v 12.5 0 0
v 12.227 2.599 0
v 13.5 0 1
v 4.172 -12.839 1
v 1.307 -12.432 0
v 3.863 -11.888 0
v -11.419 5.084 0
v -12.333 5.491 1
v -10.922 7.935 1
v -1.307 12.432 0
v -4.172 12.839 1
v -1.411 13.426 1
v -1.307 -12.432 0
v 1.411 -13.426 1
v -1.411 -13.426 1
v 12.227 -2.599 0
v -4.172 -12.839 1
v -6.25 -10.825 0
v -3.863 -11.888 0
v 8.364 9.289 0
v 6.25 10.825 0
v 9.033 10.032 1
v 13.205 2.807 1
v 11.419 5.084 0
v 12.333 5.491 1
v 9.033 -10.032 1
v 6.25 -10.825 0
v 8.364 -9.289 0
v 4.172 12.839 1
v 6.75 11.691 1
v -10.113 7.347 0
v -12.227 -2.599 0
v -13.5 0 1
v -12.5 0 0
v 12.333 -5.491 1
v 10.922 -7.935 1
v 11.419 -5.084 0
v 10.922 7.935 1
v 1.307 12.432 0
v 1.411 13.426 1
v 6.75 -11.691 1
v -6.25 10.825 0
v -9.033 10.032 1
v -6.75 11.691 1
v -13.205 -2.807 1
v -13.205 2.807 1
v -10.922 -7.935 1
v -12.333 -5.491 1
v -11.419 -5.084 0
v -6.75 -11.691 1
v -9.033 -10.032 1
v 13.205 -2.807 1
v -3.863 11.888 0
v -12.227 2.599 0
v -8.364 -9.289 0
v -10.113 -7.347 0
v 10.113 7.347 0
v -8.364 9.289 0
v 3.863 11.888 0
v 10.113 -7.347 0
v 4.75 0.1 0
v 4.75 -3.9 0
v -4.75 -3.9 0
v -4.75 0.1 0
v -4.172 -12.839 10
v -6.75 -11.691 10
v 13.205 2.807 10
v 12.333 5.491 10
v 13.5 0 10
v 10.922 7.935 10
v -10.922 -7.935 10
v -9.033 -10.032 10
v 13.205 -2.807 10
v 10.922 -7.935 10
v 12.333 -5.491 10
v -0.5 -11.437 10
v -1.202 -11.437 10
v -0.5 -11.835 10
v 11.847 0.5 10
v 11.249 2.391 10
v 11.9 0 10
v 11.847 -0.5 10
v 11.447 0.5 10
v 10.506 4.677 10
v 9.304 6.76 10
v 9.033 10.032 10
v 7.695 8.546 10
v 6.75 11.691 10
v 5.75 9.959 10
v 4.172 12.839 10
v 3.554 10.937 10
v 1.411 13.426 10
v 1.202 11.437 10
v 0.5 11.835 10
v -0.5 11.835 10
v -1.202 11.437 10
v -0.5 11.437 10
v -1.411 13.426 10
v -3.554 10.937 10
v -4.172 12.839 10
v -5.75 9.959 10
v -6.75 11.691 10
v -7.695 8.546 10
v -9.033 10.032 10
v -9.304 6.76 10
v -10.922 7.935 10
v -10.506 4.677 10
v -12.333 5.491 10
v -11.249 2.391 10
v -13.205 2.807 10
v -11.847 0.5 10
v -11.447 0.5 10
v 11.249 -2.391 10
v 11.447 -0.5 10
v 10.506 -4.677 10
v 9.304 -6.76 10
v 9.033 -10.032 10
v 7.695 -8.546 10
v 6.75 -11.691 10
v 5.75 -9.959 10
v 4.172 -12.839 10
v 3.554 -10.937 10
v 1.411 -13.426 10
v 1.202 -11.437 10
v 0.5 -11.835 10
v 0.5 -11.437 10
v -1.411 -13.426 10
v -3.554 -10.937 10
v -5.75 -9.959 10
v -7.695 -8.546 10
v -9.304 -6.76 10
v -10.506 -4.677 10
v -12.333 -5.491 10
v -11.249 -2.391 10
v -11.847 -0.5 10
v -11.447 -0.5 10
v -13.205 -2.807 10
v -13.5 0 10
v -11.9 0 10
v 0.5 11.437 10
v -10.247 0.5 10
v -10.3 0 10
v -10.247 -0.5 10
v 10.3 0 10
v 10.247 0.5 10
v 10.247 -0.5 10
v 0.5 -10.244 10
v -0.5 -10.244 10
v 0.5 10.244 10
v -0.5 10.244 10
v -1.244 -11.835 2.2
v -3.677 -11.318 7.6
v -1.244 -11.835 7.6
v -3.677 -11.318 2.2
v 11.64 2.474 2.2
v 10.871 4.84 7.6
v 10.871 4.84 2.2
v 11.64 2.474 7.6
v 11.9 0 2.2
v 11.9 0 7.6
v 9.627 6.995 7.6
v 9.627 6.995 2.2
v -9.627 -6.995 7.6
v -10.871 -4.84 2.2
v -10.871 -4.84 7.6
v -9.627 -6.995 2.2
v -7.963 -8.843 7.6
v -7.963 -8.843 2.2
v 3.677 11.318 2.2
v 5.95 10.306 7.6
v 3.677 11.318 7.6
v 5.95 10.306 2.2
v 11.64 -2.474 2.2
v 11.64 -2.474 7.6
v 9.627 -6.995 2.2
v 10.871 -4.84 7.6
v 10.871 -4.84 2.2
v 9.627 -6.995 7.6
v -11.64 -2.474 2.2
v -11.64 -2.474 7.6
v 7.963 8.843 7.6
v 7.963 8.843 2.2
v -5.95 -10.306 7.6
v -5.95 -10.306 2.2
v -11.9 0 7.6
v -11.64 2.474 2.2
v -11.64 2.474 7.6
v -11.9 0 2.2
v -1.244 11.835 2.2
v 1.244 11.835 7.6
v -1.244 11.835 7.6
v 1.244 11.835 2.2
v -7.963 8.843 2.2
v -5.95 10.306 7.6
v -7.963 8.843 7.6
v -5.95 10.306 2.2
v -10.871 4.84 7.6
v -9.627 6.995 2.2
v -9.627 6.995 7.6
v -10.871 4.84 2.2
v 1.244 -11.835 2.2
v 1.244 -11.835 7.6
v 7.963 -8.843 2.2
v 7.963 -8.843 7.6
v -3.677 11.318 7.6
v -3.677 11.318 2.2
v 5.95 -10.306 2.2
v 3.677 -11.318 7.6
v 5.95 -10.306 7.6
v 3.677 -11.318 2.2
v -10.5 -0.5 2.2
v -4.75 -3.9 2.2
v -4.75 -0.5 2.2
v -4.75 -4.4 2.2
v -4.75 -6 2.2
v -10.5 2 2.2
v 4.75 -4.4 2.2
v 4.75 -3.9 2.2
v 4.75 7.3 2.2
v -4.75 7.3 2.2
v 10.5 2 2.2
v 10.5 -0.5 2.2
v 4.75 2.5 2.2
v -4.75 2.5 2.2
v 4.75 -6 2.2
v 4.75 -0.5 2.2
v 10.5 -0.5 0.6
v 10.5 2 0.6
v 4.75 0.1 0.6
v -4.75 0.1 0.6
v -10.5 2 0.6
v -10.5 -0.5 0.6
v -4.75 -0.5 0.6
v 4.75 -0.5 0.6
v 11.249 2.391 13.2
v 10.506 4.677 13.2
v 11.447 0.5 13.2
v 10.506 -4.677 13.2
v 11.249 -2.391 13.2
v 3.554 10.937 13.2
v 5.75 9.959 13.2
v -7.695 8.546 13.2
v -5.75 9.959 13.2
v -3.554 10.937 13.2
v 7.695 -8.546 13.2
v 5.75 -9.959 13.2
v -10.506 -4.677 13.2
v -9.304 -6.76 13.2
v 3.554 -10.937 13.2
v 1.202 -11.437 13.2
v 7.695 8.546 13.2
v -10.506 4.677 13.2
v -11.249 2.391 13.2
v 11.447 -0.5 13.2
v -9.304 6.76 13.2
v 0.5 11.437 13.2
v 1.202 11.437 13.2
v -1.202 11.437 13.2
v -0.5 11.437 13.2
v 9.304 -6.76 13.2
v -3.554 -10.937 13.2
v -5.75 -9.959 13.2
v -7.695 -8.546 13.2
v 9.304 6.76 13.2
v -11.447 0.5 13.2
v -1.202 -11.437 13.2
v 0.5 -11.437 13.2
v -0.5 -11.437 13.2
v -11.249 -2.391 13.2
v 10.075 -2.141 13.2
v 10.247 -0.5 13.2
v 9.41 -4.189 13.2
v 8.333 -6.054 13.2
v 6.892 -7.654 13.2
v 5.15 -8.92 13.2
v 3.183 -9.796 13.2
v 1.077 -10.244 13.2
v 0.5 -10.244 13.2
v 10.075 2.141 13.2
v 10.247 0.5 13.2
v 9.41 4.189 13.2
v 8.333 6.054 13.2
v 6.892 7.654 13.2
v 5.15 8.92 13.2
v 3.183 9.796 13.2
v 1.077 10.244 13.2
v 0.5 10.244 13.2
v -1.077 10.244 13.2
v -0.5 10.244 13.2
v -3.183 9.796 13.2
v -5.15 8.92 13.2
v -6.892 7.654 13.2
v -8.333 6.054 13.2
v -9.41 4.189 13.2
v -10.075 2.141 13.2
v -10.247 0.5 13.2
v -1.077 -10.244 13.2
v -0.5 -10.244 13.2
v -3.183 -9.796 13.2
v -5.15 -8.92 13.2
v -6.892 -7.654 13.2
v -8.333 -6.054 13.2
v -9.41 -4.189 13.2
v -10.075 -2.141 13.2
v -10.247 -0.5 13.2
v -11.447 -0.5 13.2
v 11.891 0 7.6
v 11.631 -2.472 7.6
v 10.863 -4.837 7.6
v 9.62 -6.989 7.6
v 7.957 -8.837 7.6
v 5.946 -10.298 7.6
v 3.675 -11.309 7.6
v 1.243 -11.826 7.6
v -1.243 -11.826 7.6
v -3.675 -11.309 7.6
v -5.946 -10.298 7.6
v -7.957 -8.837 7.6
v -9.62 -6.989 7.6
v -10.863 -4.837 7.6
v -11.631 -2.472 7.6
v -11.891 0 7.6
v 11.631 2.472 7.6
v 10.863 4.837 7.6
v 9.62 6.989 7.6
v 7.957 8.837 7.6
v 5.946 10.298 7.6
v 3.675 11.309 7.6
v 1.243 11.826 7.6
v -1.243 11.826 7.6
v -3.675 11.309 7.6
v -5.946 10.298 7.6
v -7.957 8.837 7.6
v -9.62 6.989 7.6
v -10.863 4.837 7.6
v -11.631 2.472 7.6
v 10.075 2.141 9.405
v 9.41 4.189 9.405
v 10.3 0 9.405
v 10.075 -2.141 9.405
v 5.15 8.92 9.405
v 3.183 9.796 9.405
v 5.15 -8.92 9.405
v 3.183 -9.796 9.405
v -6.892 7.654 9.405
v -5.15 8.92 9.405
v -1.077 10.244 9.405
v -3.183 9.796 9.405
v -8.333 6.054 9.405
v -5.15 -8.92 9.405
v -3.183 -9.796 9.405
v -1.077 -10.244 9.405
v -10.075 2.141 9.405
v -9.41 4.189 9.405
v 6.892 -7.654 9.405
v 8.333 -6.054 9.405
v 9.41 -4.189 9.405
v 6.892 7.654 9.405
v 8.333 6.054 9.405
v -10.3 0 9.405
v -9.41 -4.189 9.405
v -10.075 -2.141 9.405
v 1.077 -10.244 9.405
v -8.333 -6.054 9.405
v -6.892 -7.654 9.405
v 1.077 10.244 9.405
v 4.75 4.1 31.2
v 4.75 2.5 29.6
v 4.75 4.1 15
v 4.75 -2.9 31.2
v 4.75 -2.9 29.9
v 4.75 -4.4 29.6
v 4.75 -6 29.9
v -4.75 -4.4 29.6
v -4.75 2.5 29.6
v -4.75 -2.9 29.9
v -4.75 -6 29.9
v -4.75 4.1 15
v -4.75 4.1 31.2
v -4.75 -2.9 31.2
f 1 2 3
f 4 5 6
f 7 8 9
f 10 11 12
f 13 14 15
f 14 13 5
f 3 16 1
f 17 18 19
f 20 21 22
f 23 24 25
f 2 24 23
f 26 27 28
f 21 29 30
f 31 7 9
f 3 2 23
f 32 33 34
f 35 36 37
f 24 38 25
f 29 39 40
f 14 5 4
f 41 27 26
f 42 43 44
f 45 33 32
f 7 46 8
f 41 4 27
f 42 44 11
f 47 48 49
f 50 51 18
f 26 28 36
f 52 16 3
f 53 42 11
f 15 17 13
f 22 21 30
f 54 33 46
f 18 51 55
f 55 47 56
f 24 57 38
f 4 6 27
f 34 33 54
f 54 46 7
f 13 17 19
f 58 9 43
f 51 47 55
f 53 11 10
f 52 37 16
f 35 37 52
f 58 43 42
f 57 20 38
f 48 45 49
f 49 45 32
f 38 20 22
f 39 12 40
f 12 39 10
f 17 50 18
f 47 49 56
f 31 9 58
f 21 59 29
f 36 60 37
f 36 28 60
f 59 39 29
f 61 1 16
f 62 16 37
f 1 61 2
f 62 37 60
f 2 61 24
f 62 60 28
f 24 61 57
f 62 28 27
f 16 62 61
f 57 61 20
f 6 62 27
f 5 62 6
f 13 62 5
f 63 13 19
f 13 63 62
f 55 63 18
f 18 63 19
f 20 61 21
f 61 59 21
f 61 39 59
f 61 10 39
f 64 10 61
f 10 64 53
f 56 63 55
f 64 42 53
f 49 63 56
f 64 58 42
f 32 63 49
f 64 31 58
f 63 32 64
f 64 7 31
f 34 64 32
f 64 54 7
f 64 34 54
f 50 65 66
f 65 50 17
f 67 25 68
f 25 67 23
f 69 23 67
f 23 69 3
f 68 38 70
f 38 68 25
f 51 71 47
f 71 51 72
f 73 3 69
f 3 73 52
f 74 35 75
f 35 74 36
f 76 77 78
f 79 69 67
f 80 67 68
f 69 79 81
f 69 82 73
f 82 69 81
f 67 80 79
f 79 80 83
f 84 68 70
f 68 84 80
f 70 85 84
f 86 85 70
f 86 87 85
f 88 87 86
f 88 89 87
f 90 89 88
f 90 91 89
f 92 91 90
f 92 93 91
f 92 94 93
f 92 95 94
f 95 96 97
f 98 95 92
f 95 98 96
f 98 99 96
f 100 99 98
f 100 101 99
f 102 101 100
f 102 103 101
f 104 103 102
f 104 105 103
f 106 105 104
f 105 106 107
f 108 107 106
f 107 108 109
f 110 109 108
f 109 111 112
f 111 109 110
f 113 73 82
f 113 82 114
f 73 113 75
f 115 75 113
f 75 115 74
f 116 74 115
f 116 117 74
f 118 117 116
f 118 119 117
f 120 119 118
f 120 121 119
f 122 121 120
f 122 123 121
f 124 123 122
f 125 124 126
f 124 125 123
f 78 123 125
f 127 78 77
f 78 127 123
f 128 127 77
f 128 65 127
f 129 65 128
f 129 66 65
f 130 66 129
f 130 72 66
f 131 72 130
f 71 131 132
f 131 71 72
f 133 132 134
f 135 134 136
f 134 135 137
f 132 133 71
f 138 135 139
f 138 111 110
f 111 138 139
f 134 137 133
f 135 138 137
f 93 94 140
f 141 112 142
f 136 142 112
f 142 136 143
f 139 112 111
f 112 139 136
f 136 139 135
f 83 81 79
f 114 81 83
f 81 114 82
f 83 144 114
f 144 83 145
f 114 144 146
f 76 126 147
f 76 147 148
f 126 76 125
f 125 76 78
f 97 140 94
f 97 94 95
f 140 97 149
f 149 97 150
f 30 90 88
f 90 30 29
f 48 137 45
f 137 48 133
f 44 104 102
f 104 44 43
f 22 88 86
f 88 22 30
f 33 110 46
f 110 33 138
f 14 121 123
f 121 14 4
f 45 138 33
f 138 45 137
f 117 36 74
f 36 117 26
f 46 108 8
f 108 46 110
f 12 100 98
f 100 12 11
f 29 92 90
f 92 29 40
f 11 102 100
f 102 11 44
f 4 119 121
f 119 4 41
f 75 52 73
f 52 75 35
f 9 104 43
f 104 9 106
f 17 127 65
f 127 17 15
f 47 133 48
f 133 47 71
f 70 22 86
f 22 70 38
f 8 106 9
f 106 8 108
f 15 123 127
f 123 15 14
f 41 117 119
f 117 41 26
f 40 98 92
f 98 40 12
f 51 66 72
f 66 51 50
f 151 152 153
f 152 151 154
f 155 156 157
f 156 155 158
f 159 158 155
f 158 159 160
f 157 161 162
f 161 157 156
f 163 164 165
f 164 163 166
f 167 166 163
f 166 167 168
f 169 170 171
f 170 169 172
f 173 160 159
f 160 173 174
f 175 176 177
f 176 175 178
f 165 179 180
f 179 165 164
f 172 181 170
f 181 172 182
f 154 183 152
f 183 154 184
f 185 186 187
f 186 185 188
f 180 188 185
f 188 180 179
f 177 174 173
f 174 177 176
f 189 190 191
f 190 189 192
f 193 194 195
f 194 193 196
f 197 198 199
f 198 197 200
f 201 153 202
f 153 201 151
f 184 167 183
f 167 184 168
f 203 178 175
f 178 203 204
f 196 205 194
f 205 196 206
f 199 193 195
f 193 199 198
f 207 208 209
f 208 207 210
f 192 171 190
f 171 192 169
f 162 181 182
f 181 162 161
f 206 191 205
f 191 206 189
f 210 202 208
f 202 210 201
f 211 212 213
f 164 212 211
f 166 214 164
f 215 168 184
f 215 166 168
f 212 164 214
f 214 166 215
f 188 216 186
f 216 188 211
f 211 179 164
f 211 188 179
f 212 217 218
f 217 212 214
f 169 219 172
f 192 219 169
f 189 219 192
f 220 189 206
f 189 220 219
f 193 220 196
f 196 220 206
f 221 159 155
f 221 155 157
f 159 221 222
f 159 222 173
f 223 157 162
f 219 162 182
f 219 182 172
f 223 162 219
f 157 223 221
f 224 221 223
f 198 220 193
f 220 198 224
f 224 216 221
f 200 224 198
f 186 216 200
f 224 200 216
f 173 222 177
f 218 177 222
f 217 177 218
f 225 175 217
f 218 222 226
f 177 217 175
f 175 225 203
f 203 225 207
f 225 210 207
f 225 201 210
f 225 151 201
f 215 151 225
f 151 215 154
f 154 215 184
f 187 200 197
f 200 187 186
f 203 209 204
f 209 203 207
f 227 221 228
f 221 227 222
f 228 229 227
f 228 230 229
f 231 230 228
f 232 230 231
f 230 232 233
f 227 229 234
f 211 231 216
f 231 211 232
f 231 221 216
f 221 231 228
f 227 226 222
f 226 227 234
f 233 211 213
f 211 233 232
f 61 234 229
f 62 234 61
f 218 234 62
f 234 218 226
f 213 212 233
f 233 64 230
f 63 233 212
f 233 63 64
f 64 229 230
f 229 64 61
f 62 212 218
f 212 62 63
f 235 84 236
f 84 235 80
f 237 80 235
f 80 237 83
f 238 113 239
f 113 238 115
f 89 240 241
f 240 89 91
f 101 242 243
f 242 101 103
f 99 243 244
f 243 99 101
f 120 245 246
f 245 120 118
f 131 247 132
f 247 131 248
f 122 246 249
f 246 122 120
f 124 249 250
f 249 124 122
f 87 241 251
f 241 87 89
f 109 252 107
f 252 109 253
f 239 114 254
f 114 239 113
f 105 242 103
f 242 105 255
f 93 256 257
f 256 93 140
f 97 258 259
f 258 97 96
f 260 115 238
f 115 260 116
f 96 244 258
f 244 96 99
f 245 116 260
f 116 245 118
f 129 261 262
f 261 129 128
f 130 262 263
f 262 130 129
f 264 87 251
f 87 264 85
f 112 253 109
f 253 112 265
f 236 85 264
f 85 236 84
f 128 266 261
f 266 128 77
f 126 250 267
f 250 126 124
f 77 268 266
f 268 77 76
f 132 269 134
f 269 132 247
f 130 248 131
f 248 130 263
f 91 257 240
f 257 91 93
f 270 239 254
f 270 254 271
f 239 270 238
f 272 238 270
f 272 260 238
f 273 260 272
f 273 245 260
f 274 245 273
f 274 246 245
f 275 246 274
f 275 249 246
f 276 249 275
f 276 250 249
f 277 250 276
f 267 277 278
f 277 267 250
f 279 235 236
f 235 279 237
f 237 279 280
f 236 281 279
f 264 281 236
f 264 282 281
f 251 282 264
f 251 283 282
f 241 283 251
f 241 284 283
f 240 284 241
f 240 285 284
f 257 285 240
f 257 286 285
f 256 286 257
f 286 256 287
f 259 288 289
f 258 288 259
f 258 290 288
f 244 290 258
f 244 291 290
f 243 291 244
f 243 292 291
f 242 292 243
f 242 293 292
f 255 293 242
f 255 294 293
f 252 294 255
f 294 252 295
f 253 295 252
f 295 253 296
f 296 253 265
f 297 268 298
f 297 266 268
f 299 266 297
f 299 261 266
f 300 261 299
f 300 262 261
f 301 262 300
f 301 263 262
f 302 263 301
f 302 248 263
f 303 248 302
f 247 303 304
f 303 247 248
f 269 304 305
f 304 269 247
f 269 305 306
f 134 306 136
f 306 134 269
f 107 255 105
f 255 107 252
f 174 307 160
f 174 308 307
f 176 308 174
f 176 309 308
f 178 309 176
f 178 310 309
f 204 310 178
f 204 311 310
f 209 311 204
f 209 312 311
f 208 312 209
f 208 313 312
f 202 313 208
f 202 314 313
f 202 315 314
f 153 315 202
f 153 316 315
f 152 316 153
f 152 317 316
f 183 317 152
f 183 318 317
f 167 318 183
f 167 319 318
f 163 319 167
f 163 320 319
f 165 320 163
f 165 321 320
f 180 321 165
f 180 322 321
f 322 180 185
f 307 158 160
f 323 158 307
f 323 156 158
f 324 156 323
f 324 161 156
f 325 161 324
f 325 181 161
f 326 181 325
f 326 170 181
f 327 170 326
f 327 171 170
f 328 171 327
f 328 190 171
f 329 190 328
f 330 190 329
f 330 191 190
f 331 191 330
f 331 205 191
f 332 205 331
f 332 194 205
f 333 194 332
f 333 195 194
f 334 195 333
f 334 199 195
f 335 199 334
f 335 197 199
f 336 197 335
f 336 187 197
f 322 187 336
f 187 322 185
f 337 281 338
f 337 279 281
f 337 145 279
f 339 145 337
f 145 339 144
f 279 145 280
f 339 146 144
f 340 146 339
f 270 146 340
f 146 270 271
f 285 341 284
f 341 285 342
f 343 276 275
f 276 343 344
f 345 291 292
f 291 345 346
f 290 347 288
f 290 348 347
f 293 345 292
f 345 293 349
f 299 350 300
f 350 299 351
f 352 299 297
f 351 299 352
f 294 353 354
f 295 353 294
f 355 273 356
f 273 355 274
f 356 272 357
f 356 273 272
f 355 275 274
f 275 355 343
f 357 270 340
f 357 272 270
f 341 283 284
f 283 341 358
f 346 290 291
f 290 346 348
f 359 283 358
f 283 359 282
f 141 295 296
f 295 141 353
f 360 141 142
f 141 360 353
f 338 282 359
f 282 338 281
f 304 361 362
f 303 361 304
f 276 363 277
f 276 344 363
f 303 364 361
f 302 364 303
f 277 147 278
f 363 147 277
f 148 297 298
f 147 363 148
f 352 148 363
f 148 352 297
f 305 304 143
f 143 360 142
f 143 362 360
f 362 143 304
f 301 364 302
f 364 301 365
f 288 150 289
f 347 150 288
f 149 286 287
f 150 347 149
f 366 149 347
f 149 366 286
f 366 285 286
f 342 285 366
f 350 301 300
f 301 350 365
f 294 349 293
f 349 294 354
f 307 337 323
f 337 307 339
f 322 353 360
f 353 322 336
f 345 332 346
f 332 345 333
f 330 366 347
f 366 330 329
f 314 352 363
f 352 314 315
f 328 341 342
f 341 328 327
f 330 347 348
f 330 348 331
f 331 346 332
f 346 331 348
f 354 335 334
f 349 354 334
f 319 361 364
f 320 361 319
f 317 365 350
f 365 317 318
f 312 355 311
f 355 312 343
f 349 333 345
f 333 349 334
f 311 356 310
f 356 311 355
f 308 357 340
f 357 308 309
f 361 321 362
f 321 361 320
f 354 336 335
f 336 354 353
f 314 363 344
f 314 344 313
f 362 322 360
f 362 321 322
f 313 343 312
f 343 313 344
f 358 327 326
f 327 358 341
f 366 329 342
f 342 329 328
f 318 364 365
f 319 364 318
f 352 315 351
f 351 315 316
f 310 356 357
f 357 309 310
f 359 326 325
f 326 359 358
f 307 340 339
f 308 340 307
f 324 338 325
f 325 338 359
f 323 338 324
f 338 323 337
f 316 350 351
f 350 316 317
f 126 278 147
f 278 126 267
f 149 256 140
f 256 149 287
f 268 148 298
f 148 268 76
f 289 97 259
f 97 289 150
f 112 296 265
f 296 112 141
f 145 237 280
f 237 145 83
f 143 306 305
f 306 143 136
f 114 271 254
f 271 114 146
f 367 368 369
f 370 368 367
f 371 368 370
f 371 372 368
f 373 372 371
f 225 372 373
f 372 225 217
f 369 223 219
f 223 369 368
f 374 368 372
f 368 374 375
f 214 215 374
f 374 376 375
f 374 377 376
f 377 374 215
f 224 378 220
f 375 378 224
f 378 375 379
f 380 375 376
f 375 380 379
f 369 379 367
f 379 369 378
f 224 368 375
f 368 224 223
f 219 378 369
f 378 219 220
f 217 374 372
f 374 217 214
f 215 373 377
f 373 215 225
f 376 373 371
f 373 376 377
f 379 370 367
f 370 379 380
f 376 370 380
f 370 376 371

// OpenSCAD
thickness=1.6;
diameter = 27;
height = 50;
switchD = 23;
hidden=30;

baseH = 10;
chargeW = 21;
chargeH = 28;
usbX = 9.5;
usbY = 4;

thin = 0.3;
slack=0.8;

module head()
{

    module switchPosition()
    {
        translate([0,0,20]) rotate([90,0,0]) children();
    }

   
    difference() {
        union() {
            cylinder( d=diameter, h=height );
            switchPosition() {
                hull() {
                    cylinder( d=switchD + thickness *2, h=diameter/2 );
                    translate( [0,20,0] ) cylinder( d=10, h=diameter/2 );
                }
            }
            mirror([0,0,1]) cylinder( d1=diameter, d2=diameter+hidden/10, h=hidden );
        }
        
        translate( [0,0,-1] ) cylinder( d=diameter-thickness*2, h=height+2 );

        // Main hole for the switch
        switchPosition() translate([0,0,-1]) cylinder( d=switchD-2, h=diameter/2+2 );
        // Bigger hole, not quite to the edge for the switch
        switchPosition() translate([0,0,-1]) cylinder( d=switchD, h=diameter/2 );
        
        mirror([0,0,1]) translate([0,0,-0.1]) cylinder( d1=diameter-thickness*2, d2=diameter+hidden/10-thickness*2, h=hidden+0.2 );
        translate([-2,-diameter,-hidden-1]) cube( [4,diameter*2,hidden+1] );
        translate([-diameter,-2,-hidden-1]) cube( [diameter*2,4,hidden+1] );
    }

}


module lip( height=thickness*2 )
{
    foo=diameter-slack;
    
    difference() {
        union() {
            translate( [0,0,-thickness] ) cylinder( d=foo-thickness*2, h=height+thickness );
            translate( [0,0,-thickness-slack] ) cylinder( d=foo+slack, h=thickness+slack );
        }
        translate([0,0,-thickness-1]) cylinder( d=diameter-thickness*4, h=height+thickness+2 );
        translate( [0,0,-thickness-slack-0.01] ) cylinder( d1=diameter-thickness*2, d2=0, h=diameter/2 );
        
        translate([-0.5,-diameter/2,0]) cube([1,diameter,height+1]);
        translate([-diameter/2,-0.5,0]) cube([diameter,1,height+1]);
    }
}

module base()
{
    usbH = 0.6;
    chamfer=1;
    
    difference() {
        
        union() {
            cylinder(d1=diameter-chamfer*2, d2=diameter, h=chamfer );
            translate( [0,0,chamfer] ) cylinder(  d=diameter, h=baseH-chamfer );
        }
                
        translate( [0,0,thickness+usbH] ) cylinder ( d=diameter-thickness*2, h=baseH );
        // Slot for charger circuit  board
        translate([-chargeW/2,-0.5,usbH]) cube( [chargeW,2.5,4] );
        // Hole for USB connection
        translate([-usbX/2,-usbY+0.1,-1]) cube( [usbX, usbY,8] );
    }

    // Uprights for charger support
    translate([-usbX/2, 2.5, 0]) cube( [usbX, thickness, chargeH + thickness] );
    hull() {
        translate([-usbX/2, 2.5, 0]) cube( [usbX, thickness, 15] );
        translate([-usbX/2, 6,0]) cube( [usbX, thickness, 1] );
    }
    translate([-usbX/2, -6, 0])  cube( [usbX, thickness, chargeH + thickness] );

    // 1 layer span across supports
    translate([-usbX/2, -6, chargeH+thickness]) cube( [usbX, 2.5+6 + thickness, thin] );
    // Charger back stop (on top of the 1 layer span)
    translate([-usbX/2, -4.5+thickness, chargeH+thickness]) cube( [usbX, 7, thickness] );

    translate( [0,0,baseH] ) lip();
}


module inspect()
{
    intersection() {
        translate([-50,-0.5,0] )cube( [100,1,100] );
        children();
    }
}

module tube( height, lip=thickness*2 )
{
    linear_extrude( height ) {
        difference() {
            circle( d=diameter );
            circle( d=diameter-thickness*2 );
        }
    }
    translate( [0,0,height] ) lip(lip);
}


base();

//translate( [40,0,0] ) tube( 50 );
